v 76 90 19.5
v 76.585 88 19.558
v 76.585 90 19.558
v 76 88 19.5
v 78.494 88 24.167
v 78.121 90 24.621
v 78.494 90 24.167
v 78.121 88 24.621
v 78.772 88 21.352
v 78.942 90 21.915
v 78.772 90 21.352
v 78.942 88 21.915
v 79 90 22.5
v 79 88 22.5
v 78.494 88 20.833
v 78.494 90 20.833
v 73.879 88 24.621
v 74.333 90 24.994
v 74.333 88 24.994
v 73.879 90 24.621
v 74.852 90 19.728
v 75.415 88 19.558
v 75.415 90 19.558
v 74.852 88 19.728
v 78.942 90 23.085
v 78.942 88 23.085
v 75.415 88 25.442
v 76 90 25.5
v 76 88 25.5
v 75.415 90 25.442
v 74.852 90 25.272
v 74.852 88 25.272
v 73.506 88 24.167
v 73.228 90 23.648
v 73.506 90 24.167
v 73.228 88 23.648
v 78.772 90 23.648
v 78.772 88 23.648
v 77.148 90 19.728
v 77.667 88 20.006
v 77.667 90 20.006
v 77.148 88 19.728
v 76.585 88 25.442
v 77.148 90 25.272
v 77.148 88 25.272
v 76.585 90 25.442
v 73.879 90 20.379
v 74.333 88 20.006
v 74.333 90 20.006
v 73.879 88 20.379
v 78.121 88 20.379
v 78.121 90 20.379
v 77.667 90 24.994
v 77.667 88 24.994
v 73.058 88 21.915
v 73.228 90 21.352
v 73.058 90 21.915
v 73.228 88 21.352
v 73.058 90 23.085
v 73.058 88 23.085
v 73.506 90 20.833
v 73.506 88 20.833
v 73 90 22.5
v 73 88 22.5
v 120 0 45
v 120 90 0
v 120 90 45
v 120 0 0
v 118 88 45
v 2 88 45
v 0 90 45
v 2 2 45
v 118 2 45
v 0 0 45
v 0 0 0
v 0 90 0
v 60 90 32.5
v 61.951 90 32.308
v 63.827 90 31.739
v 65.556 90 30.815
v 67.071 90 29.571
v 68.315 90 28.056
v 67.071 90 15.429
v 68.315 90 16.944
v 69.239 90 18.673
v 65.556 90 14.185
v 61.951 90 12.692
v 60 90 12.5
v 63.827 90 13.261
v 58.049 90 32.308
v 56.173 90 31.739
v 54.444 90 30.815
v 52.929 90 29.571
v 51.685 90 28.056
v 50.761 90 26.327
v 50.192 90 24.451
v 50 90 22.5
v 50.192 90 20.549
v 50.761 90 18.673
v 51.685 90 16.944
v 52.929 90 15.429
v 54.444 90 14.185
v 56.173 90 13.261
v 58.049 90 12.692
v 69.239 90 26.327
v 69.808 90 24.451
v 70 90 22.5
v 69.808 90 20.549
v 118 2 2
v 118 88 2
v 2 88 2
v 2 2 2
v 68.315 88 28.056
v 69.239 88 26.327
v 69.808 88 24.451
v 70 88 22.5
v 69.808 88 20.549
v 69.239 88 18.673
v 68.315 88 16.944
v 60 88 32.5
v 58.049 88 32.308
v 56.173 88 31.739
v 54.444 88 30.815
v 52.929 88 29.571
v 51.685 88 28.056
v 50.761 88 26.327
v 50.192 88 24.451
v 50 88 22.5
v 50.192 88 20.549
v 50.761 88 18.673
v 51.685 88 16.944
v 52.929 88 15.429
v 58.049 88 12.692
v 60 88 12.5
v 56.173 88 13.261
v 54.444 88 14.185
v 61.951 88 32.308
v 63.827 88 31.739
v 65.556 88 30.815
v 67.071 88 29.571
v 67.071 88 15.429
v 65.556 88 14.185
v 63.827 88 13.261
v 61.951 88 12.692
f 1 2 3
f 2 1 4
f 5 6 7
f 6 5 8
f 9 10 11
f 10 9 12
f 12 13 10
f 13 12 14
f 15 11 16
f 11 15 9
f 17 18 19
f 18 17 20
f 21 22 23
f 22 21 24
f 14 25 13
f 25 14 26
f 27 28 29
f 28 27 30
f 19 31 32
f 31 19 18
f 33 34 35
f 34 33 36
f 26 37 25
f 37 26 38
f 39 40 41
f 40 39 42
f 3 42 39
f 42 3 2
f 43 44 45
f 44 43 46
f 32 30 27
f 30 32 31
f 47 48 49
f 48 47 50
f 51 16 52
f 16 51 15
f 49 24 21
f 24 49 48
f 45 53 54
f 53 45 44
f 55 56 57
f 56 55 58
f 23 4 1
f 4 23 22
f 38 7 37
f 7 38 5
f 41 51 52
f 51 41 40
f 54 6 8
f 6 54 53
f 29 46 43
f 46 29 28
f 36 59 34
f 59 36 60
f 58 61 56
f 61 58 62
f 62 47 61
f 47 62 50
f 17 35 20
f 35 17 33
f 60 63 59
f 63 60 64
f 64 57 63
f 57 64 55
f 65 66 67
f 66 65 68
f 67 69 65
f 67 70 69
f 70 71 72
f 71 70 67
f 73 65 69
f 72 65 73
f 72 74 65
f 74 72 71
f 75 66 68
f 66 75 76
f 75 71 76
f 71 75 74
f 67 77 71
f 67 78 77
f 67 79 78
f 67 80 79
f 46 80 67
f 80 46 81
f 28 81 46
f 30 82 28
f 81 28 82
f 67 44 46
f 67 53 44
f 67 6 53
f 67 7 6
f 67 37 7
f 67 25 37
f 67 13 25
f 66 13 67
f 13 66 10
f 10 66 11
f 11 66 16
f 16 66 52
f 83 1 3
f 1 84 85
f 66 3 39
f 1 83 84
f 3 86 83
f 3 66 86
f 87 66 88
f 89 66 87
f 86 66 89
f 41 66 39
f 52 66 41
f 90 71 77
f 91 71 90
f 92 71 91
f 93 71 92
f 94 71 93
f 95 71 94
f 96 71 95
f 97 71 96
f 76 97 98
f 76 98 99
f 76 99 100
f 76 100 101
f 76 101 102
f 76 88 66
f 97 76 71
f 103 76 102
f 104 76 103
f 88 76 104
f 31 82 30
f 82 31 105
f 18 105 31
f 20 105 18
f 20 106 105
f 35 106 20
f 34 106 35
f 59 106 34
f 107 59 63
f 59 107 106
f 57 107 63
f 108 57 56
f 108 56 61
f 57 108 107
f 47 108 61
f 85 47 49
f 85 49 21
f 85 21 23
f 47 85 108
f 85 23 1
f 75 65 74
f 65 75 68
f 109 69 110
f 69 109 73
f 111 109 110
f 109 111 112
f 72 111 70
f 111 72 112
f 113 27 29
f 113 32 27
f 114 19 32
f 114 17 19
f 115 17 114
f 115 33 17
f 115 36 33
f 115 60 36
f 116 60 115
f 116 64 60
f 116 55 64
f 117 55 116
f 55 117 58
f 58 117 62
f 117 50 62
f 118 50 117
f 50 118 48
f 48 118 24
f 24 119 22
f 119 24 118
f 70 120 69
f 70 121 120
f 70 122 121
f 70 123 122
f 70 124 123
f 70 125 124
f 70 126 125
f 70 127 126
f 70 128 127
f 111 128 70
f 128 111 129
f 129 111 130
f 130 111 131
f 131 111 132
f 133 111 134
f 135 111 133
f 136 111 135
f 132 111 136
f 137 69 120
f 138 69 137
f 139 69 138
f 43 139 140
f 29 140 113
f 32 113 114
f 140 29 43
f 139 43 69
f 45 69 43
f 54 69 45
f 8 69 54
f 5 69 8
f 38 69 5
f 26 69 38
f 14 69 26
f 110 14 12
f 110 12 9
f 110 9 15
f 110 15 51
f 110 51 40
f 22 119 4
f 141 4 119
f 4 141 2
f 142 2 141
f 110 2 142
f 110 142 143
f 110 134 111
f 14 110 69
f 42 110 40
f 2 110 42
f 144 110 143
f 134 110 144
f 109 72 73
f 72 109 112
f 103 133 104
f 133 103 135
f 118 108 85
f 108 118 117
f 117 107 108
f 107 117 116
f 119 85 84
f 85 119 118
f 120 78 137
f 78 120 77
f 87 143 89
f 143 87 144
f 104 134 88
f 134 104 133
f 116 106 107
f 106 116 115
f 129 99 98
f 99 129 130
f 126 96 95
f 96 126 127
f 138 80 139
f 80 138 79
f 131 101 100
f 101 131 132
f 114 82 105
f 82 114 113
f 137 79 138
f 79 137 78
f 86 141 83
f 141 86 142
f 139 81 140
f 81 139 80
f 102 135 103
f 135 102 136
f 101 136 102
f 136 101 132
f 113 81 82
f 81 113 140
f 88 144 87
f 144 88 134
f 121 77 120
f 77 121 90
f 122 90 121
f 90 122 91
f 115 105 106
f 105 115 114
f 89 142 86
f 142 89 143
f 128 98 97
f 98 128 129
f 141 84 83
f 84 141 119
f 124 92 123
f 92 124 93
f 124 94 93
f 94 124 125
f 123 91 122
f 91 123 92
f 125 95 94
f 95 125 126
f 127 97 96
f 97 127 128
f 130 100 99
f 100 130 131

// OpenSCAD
$fn = 32;

// ----------------------------------------------------------------------
// Vent box: roundvent enclosure
// ----------------------------------------------------------------------

// --- parameters (mm) ---
box_l = 120;              // box length, X
box_w = 90;               // box width, Y
box_h = 45;               // box height, Z
wall_t = 2;               // shell wall thickness
vent_d = 20;              // central vent diameter
ring_d = 6;               // ring hole diameter
n_ring = 8;               // holes in the ring
ring_r = 16;              // ring radius

ring_step = 360 / n_ring;  // ring hole angular step

difference() {
  cube([box_l, box_w, box_h]);
  translate([wall_t, wall_t, wall_t])
    cube([box_l - 2 * wall_t, box_w - 2 * wall_t, box_h]);
  translate([box_l / 2, box_w - wall_t - 1, box_h / 2])
    rotate([-90, 0, 0]) cylinder(h = wall_t + 2, d = vent_d);
  for (i = [0 : n_ring - 1])
    translate([box_l / 2, box_w - wall_t - 1, box_h / 2])
      rotate([0, 0, i * ring_step])
        translate([ring_r, 0, 0]) rotate([-90, 0, 0])
          cylinder(h = wall_t + 2, d = ring_d);
}
